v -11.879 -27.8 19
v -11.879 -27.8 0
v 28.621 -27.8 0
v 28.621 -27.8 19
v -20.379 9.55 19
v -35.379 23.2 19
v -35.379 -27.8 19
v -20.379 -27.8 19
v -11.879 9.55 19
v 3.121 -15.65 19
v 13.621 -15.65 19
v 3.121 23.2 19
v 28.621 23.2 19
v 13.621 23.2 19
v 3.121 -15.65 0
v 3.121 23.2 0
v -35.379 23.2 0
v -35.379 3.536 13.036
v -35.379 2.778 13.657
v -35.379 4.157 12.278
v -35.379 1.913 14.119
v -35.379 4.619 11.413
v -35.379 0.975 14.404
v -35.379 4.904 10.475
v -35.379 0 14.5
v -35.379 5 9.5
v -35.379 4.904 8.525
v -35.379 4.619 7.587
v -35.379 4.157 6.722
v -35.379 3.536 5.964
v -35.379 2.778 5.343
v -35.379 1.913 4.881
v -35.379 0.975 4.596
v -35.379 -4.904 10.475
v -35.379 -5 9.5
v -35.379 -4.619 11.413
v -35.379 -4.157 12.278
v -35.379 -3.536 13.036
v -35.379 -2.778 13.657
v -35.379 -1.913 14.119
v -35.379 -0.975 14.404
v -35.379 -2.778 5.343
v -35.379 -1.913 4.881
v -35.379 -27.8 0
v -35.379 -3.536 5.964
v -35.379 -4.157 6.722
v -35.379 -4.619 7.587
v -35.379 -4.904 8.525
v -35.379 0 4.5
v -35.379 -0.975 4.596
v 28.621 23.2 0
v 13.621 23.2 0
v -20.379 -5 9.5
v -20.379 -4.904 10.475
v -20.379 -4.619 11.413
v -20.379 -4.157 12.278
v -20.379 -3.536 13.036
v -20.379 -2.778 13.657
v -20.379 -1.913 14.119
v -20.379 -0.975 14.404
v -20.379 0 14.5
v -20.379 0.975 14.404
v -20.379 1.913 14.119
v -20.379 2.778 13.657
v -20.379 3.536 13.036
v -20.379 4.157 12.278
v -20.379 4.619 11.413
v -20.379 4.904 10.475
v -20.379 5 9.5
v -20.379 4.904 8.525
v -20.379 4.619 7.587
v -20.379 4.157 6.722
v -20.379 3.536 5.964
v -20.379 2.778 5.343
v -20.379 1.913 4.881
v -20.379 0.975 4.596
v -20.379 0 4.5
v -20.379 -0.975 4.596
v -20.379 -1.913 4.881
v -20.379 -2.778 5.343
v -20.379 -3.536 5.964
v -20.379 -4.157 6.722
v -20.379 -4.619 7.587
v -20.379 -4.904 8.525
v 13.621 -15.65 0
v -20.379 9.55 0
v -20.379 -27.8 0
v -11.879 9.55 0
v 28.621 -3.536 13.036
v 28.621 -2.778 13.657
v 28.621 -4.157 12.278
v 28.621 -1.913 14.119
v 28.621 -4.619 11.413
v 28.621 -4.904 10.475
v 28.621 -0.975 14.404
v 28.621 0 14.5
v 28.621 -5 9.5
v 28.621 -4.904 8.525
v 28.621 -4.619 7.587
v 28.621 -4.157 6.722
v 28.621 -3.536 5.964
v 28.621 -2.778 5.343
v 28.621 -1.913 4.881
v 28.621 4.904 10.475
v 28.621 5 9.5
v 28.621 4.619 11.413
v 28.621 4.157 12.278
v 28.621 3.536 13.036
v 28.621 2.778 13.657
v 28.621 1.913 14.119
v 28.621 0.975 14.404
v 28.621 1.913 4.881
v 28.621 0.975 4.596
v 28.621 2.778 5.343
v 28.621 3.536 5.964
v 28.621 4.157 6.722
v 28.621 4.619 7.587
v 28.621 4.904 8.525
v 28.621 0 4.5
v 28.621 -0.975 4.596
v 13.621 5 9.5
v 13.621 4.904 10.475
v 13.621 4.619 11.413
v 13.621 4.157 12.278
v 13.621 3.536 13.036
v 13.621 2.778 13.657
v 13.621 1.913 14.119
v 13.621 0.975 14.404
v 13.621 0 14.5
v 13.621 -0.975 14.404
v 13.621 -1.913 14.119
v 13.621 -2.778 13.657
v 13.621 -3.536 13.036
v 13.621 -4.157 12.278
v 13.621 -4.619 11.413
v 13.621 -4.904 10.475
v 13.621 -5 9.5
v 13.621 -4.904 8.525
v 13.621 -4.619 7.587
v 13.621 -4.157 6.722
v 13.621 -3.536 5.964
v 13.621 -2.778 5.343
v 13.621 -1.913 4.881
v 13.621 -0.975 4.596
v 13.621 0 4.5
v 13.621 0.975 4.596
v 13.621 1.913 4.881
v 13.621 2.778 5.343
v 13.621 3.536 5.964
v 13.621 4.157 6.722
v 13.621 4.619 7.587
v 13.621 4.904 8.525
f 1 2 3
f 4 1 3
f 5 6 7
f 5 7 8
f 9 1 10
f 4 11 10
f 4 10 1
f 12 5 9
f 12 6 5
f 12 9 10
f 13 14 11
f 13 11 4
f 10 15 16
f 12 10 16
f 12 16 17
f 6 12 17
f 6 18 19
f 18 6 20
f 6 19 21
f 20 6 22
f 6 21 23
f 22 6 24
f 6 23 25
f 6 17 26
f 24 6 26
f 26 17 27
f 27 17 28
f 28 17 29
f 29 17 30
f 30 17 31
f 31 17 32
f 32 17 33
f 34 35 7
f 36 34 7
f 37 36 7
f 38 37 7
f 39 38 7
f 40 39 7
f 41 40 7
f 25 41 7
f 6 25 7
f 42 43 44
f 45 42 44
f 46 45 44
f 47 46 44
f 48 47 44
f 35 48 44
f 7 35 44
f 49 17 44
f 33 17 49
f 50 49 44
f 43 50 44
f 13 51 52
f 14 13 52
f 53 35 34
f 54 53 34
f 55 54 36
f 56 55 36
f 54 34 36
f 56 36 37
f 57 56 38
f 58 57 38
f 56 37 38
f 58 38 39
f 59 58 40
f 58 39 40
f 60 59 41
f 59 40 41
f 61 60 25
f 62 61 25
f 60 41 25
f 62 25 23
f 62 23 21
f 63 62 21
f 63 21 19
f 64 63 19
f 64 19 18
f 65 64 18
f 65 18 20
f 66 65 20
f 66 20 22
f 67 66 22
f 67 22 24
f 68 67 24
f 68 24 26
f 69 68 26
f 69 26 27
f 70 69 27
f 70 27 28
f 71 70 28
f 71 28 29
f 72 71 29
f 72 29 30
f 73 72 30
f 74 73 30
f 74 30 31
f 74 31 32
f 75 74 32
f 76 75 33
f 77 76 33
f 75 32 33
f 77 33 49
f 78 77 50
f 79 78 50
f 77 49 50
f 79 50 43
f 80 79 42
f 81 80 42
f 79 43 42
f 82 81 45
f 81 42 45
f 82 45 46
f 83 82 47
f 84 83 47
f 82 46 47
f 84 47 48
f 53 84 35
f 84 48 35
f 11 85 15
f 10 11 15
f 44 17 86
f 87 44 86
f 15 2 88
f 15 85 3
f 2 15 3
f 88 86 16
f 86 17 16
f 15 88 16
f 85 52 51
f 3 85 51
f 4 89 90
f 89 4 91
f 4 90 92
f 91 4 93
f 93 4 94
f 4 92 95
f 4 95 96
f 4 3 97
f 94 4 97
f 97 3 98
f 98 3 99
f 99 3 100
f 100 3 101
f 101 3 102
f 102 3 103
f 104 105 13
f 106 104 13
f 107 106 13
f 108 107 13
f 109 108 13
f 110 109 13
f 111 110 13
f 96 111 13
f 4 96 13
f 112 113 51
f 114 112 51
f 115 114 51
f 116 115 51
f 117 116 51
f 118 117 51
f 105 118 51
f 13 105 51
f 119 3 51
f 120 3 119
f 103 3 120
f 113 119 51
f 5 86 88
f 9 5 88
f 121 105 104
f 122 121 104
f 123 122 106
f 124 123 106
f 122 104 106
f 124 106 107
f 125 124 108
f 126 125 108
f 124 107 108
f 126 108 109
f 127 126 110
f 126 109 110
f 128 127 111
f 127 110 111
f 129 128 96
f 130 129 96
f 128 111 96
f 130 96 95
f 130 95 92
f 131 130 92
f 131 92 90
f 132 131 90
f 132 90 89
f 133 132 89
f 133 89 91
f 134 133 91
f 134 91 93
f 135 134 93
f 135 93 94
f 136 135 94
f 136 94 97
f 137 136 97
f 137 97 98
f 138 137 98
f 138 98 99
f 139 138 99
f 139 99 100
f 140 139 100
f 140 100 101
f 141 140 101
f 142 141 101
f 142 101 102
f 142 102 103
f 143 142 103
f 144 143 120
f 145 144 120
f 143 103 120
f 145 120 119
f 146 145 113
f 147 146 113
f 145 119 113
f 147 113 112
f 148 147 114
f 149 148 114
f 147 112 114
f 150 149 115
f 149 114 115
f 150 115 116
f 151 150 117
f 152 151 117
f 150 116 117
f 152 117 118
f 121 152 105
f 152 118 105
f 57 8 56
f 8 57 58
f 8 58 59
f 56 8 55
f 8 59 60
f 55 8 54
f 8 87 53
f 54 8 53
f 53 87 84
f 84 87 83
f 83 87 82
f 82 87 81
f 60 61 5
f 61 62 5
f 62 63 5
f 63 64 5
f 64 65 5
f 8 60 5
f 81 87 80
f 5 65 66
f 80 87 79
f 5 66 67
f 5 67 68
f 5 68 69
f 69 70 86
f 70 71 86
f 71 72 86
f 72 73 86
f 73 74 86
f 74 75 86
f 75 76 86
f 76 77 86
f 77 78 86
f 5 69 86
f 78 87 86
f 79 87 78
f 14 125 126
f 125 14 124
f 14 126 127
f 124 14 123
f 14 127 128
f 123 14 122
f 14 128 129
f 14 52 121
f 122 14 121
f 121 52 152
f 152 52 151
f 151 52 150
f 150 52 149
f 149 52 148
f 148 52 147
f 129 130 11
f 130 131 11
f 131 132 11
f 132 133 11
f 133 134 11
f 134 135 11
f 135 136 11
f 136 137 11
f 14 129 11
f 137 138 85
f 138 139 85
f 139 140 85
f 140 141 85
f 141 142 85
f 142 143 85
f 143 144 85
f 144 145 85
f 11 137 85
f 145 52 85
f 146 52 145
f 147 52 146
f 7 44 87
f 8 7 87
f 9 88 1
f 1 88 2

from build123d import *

# Parameters (mm, degrees)
F1_DEPTH = 19
F3_R     = 5
F4_DEPTH = 16
F6_R     = 5
F7_DEPTH = 16


with BuildPart() as f1:
    # F0 (on Top) → F1 (new body)
    with BuildSketch(Plane.XY):
        Polygon((3.1210286321, 23.2000579238), (-35.3789713679, 23.2000579238), (-35.3789713679, -27.7999420762), (-20.3789713679, -27.7999420762), (-20.3789713679, 9.5500578434), (-11.8789713679, 9.5500578434), (-11.8789713679, -27.7999420762), (28.6210286321, -27.7999420762), (28.6210286321, 23.2000579238), (13.6210286321, 23.2000579238), (13.6210286321, -15.6499421298), (3.1210286321, -15.6499421298), align=None)
    extrude(amount=F1_DEPTH)

    # F3 (on offset) → F4 (cut)
    with BuildSketch(Plane.YZ.offset(28.6210286321)):
        with Locations((0, 9.5)):
            Circle(F3_R)
    extrude(amount=-F4_DEPTH, mode=Mode.SUBTRACT)

    # F6 (on offset) → F7 (cut)
    with BuildSketch(Plane(origin=(-35.3789713679, 0, 0), x_dir=(0, -1, 0), z_dir=(-1, 0, 0))):
        with Locations((0, 9.5)):
            Circle(F6_R)
    extrude(amount=-F7_DEPTH, mode=Mode.SUBTRACT)


solid = f1.part
